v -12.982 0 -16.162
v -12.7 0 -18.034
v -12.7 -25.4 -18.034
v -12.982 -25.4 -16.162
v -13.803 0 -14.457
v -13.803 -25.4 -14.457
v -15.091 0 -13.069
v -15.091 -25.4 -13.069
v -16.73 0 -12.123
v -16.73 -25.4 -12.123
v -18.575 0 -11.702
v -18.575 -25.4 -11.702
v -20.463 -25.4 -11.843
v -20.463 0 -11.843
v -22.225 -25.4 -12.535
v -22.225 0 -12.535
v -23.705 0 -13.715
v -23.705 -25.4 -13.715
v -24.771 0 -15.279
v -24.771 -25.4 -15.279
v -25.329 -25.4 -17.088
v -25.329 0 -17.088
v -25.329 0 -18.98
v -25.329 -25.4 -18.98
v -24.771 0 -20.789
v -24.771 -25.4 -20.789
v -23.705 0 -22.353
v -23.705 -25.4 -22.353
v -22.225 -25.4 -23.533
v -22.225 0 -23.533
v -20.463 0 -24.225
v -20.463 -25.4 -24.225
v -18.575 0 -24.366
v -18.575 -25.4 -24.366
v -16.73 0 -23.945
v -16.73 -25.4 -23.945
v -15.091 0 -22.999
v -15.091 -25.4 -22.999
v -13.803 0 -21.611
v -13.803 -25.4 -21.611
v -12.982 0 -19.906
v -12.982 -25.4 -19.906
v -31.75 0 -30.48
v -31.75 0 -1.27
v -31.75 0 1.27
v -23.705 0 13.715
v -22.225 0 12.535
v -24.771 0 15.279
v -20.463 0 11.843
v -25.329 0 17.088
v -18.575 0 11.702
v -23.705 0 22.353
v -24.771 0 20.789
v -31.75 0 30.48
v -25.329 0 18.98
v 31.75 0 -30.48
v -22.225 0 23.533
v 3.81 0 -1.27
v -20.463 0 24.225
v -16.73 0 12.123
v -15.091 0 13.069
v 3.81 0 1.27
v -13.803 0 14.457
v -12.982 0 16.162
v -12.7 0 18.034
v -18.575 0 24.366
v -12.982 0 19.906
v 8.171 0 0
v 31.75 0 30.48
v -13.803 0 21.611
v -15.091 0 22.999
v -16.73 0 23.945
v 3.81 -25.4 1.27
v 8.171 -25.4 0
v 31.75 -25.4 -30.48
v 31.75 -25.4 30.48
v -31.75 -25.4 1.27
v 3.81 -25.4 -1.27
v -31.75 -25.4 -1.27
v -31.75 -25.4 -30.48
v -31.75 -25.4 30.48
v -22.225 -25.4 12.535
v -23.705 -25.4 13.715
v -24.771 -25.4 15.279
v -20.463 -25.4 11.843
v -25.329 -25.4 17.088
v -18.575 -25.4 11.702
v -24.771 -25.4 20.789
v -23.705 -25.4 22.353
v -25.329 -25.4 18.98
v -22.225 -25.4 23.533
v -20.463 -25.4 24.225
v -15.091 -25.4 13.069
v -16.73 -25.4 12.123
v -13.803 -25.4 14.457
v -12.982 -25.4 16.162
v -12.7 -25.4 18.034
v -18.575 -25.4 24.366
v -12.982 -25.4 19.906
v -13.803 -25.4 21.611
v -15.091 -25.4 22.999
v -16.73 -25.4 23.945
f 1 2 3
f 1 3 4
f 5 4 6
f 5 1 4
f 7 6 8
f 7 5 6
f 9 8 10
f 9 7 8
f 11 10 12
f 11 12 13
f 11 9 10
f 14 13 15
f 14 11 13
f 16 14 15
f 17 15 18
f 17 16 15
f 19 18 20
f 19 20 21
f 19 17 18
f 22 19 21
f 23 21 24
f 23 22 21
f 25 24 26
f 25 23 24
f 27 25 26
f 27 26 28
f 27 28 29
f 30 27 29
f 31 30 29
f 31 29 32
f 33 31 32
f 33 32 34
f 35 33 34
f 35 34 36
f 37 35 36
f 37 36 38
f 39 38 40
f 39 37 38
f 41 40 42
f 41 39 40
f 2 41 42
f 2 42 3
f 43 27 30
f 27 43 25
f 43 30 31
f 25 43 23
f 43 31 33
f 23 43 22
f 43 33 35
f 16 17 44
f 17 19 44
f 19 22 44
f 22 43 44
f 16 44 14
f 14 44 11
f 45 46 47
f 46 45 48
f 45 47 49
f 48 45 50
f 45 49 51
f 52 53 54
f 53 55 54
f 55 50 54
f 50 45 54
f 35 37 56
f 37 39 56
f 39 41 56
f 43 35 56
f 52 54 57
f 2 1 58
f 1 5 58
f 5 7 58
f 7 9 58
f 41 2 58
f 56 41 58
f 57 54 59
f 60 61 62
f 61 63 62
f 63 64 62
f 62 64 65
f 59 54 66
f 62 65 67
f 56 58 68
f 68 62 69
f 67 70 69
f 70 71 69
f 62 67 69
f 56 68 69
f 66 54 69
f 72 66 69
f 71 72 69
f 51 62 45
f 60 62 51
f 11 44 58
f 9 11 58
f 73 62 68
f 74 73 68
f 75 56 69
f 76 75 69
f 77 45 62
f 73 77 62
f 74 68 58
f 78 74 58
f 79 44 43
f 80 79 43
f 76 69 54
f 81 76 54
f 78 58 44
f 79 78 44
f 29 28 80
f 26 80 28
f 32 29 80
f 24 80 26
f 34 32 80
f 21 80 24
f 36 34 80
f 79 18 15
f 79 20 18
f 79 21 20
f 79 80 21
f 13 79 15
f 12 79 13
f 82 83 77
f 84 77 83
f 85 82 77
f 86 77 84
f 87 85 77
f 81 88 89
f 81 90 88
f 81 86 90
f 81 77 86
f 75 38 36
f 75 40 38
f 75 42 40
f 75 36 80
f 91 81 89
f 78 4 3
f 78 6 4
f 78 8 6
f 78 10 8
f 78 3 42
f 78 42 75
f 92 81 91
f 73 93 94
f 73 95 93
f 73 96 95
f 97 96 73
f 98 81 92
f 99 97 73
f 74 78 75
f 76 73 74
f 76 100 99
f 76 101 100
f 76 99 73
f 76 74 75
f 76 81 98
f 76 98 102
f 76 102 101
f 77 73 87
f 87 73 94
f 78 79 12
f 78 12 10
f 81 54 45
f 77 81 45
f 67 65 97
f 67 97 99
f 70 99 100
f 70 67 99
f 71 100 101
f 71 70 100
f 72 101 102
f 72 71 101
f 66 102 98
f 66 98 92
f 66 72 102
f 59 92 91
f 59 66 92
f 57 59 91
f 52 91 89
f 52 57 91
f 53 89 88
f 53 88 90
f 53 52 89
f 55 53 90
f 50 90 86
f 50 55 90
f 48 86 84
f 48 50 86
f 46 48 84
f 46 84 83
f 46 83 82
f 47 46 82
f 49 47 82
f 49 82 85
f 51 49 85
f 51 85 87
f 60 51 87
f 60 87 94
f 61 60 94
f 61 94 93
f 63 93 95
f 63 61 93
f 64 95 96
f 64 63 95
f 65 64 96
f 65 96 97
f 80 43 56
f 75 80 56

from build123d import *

# Parameters (mm, degrees)
F0_R     = 6.35
F1_DEPTH = 25.4


with BuildPart() as f1:
    # F0 (on Front) → F1 (new body)
    with BuildSketch(Plane.XZ):
        Polygon((-31.75, -1.27), (-31.75, -30.48), (31.75, -30.48), (31.75, 30.48), (-31.75, 30.48), (-31.75, 1.27), (3.81, 1.27), (8.171243, 0), (3.81, -1.27), align=None)
        with Locations((-19.05, -18.034)):
            Circle(F0_R, mode=Mode.SUBTRACT)
        with Locations((-19.05, 18.034)):
            Circle(F0_R, mode=Mode.SUBTRACT)
    extrude(amount=F1_DEPTH)


solid = f1.part
